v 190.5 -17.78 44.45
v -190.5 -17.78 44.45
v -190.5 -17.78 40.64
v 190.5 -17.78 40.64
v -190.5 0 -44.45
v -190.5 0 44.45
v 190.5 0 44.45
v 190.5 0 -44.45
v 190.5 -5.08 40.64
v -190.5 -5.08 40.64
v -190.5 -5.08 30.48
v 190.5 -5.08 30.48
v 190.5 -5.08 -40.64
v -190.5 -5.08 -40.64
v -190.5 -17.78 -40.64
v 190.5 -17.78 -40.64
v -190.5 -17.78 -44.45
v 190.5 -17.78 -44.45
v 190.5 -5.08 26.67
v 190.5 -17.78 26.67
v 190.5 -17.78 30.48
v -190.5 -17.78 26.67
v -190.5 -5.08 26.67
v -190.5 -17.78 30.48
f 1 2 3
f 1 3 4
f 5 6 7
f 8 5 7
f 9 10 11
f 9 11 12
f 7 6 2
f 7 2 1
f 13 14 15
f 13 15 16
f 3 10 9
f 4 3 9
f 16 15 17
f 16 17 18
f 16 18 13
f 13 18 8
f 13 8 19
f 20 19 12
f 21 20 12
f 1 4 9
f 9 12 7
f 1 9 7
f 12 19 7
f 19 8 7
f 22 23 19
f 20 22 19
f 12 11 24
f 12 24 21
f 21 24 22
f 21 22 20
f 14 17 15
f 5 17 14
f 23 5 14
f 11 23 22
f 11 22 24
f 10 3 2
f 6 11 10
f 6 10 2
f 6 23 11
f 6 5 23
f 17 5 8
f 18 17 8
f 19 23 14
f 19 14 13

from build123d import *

# Parameters (mm, degrees)
F0_W     = 381
F0_H     = 88.9
F1_DEPTH = 5.08
F2_W     = 381
F2_H     = 3.81
F3_DEPTH = 12.7
F4_W     = 381
F4_H     = 3.81
F5_DEPTH = 12.7


with BuildPart() as f1:
    # F0 (on Front) → F1 (new body)
    with BuildSketch(Plane.XZ):
        Rectangle(F0_W, F0_H)
    extrude(amount=F1_DEPTH)

    # F2 (on face) → F3 (join)
    with BuildSketch(Plane.XZ.offset(5.08)):
        with Locations((0, 42.545)):
            Rectangle(F2_W, F2_H)
        with Locations((0, -42.545)):
            Rectangle(F2_W, F2_H)
    extrude(amount=F3_DEPTH)

    # F4 (on face) → F5 (join)
    with BuildSketch(Plane.XZ.offset(5.08)):
        with Locations((0, 28.575)):
            Rectangle(F4_W, F4_H)
    extrude(amount=F5_DEPTH)


solid = f1.part
